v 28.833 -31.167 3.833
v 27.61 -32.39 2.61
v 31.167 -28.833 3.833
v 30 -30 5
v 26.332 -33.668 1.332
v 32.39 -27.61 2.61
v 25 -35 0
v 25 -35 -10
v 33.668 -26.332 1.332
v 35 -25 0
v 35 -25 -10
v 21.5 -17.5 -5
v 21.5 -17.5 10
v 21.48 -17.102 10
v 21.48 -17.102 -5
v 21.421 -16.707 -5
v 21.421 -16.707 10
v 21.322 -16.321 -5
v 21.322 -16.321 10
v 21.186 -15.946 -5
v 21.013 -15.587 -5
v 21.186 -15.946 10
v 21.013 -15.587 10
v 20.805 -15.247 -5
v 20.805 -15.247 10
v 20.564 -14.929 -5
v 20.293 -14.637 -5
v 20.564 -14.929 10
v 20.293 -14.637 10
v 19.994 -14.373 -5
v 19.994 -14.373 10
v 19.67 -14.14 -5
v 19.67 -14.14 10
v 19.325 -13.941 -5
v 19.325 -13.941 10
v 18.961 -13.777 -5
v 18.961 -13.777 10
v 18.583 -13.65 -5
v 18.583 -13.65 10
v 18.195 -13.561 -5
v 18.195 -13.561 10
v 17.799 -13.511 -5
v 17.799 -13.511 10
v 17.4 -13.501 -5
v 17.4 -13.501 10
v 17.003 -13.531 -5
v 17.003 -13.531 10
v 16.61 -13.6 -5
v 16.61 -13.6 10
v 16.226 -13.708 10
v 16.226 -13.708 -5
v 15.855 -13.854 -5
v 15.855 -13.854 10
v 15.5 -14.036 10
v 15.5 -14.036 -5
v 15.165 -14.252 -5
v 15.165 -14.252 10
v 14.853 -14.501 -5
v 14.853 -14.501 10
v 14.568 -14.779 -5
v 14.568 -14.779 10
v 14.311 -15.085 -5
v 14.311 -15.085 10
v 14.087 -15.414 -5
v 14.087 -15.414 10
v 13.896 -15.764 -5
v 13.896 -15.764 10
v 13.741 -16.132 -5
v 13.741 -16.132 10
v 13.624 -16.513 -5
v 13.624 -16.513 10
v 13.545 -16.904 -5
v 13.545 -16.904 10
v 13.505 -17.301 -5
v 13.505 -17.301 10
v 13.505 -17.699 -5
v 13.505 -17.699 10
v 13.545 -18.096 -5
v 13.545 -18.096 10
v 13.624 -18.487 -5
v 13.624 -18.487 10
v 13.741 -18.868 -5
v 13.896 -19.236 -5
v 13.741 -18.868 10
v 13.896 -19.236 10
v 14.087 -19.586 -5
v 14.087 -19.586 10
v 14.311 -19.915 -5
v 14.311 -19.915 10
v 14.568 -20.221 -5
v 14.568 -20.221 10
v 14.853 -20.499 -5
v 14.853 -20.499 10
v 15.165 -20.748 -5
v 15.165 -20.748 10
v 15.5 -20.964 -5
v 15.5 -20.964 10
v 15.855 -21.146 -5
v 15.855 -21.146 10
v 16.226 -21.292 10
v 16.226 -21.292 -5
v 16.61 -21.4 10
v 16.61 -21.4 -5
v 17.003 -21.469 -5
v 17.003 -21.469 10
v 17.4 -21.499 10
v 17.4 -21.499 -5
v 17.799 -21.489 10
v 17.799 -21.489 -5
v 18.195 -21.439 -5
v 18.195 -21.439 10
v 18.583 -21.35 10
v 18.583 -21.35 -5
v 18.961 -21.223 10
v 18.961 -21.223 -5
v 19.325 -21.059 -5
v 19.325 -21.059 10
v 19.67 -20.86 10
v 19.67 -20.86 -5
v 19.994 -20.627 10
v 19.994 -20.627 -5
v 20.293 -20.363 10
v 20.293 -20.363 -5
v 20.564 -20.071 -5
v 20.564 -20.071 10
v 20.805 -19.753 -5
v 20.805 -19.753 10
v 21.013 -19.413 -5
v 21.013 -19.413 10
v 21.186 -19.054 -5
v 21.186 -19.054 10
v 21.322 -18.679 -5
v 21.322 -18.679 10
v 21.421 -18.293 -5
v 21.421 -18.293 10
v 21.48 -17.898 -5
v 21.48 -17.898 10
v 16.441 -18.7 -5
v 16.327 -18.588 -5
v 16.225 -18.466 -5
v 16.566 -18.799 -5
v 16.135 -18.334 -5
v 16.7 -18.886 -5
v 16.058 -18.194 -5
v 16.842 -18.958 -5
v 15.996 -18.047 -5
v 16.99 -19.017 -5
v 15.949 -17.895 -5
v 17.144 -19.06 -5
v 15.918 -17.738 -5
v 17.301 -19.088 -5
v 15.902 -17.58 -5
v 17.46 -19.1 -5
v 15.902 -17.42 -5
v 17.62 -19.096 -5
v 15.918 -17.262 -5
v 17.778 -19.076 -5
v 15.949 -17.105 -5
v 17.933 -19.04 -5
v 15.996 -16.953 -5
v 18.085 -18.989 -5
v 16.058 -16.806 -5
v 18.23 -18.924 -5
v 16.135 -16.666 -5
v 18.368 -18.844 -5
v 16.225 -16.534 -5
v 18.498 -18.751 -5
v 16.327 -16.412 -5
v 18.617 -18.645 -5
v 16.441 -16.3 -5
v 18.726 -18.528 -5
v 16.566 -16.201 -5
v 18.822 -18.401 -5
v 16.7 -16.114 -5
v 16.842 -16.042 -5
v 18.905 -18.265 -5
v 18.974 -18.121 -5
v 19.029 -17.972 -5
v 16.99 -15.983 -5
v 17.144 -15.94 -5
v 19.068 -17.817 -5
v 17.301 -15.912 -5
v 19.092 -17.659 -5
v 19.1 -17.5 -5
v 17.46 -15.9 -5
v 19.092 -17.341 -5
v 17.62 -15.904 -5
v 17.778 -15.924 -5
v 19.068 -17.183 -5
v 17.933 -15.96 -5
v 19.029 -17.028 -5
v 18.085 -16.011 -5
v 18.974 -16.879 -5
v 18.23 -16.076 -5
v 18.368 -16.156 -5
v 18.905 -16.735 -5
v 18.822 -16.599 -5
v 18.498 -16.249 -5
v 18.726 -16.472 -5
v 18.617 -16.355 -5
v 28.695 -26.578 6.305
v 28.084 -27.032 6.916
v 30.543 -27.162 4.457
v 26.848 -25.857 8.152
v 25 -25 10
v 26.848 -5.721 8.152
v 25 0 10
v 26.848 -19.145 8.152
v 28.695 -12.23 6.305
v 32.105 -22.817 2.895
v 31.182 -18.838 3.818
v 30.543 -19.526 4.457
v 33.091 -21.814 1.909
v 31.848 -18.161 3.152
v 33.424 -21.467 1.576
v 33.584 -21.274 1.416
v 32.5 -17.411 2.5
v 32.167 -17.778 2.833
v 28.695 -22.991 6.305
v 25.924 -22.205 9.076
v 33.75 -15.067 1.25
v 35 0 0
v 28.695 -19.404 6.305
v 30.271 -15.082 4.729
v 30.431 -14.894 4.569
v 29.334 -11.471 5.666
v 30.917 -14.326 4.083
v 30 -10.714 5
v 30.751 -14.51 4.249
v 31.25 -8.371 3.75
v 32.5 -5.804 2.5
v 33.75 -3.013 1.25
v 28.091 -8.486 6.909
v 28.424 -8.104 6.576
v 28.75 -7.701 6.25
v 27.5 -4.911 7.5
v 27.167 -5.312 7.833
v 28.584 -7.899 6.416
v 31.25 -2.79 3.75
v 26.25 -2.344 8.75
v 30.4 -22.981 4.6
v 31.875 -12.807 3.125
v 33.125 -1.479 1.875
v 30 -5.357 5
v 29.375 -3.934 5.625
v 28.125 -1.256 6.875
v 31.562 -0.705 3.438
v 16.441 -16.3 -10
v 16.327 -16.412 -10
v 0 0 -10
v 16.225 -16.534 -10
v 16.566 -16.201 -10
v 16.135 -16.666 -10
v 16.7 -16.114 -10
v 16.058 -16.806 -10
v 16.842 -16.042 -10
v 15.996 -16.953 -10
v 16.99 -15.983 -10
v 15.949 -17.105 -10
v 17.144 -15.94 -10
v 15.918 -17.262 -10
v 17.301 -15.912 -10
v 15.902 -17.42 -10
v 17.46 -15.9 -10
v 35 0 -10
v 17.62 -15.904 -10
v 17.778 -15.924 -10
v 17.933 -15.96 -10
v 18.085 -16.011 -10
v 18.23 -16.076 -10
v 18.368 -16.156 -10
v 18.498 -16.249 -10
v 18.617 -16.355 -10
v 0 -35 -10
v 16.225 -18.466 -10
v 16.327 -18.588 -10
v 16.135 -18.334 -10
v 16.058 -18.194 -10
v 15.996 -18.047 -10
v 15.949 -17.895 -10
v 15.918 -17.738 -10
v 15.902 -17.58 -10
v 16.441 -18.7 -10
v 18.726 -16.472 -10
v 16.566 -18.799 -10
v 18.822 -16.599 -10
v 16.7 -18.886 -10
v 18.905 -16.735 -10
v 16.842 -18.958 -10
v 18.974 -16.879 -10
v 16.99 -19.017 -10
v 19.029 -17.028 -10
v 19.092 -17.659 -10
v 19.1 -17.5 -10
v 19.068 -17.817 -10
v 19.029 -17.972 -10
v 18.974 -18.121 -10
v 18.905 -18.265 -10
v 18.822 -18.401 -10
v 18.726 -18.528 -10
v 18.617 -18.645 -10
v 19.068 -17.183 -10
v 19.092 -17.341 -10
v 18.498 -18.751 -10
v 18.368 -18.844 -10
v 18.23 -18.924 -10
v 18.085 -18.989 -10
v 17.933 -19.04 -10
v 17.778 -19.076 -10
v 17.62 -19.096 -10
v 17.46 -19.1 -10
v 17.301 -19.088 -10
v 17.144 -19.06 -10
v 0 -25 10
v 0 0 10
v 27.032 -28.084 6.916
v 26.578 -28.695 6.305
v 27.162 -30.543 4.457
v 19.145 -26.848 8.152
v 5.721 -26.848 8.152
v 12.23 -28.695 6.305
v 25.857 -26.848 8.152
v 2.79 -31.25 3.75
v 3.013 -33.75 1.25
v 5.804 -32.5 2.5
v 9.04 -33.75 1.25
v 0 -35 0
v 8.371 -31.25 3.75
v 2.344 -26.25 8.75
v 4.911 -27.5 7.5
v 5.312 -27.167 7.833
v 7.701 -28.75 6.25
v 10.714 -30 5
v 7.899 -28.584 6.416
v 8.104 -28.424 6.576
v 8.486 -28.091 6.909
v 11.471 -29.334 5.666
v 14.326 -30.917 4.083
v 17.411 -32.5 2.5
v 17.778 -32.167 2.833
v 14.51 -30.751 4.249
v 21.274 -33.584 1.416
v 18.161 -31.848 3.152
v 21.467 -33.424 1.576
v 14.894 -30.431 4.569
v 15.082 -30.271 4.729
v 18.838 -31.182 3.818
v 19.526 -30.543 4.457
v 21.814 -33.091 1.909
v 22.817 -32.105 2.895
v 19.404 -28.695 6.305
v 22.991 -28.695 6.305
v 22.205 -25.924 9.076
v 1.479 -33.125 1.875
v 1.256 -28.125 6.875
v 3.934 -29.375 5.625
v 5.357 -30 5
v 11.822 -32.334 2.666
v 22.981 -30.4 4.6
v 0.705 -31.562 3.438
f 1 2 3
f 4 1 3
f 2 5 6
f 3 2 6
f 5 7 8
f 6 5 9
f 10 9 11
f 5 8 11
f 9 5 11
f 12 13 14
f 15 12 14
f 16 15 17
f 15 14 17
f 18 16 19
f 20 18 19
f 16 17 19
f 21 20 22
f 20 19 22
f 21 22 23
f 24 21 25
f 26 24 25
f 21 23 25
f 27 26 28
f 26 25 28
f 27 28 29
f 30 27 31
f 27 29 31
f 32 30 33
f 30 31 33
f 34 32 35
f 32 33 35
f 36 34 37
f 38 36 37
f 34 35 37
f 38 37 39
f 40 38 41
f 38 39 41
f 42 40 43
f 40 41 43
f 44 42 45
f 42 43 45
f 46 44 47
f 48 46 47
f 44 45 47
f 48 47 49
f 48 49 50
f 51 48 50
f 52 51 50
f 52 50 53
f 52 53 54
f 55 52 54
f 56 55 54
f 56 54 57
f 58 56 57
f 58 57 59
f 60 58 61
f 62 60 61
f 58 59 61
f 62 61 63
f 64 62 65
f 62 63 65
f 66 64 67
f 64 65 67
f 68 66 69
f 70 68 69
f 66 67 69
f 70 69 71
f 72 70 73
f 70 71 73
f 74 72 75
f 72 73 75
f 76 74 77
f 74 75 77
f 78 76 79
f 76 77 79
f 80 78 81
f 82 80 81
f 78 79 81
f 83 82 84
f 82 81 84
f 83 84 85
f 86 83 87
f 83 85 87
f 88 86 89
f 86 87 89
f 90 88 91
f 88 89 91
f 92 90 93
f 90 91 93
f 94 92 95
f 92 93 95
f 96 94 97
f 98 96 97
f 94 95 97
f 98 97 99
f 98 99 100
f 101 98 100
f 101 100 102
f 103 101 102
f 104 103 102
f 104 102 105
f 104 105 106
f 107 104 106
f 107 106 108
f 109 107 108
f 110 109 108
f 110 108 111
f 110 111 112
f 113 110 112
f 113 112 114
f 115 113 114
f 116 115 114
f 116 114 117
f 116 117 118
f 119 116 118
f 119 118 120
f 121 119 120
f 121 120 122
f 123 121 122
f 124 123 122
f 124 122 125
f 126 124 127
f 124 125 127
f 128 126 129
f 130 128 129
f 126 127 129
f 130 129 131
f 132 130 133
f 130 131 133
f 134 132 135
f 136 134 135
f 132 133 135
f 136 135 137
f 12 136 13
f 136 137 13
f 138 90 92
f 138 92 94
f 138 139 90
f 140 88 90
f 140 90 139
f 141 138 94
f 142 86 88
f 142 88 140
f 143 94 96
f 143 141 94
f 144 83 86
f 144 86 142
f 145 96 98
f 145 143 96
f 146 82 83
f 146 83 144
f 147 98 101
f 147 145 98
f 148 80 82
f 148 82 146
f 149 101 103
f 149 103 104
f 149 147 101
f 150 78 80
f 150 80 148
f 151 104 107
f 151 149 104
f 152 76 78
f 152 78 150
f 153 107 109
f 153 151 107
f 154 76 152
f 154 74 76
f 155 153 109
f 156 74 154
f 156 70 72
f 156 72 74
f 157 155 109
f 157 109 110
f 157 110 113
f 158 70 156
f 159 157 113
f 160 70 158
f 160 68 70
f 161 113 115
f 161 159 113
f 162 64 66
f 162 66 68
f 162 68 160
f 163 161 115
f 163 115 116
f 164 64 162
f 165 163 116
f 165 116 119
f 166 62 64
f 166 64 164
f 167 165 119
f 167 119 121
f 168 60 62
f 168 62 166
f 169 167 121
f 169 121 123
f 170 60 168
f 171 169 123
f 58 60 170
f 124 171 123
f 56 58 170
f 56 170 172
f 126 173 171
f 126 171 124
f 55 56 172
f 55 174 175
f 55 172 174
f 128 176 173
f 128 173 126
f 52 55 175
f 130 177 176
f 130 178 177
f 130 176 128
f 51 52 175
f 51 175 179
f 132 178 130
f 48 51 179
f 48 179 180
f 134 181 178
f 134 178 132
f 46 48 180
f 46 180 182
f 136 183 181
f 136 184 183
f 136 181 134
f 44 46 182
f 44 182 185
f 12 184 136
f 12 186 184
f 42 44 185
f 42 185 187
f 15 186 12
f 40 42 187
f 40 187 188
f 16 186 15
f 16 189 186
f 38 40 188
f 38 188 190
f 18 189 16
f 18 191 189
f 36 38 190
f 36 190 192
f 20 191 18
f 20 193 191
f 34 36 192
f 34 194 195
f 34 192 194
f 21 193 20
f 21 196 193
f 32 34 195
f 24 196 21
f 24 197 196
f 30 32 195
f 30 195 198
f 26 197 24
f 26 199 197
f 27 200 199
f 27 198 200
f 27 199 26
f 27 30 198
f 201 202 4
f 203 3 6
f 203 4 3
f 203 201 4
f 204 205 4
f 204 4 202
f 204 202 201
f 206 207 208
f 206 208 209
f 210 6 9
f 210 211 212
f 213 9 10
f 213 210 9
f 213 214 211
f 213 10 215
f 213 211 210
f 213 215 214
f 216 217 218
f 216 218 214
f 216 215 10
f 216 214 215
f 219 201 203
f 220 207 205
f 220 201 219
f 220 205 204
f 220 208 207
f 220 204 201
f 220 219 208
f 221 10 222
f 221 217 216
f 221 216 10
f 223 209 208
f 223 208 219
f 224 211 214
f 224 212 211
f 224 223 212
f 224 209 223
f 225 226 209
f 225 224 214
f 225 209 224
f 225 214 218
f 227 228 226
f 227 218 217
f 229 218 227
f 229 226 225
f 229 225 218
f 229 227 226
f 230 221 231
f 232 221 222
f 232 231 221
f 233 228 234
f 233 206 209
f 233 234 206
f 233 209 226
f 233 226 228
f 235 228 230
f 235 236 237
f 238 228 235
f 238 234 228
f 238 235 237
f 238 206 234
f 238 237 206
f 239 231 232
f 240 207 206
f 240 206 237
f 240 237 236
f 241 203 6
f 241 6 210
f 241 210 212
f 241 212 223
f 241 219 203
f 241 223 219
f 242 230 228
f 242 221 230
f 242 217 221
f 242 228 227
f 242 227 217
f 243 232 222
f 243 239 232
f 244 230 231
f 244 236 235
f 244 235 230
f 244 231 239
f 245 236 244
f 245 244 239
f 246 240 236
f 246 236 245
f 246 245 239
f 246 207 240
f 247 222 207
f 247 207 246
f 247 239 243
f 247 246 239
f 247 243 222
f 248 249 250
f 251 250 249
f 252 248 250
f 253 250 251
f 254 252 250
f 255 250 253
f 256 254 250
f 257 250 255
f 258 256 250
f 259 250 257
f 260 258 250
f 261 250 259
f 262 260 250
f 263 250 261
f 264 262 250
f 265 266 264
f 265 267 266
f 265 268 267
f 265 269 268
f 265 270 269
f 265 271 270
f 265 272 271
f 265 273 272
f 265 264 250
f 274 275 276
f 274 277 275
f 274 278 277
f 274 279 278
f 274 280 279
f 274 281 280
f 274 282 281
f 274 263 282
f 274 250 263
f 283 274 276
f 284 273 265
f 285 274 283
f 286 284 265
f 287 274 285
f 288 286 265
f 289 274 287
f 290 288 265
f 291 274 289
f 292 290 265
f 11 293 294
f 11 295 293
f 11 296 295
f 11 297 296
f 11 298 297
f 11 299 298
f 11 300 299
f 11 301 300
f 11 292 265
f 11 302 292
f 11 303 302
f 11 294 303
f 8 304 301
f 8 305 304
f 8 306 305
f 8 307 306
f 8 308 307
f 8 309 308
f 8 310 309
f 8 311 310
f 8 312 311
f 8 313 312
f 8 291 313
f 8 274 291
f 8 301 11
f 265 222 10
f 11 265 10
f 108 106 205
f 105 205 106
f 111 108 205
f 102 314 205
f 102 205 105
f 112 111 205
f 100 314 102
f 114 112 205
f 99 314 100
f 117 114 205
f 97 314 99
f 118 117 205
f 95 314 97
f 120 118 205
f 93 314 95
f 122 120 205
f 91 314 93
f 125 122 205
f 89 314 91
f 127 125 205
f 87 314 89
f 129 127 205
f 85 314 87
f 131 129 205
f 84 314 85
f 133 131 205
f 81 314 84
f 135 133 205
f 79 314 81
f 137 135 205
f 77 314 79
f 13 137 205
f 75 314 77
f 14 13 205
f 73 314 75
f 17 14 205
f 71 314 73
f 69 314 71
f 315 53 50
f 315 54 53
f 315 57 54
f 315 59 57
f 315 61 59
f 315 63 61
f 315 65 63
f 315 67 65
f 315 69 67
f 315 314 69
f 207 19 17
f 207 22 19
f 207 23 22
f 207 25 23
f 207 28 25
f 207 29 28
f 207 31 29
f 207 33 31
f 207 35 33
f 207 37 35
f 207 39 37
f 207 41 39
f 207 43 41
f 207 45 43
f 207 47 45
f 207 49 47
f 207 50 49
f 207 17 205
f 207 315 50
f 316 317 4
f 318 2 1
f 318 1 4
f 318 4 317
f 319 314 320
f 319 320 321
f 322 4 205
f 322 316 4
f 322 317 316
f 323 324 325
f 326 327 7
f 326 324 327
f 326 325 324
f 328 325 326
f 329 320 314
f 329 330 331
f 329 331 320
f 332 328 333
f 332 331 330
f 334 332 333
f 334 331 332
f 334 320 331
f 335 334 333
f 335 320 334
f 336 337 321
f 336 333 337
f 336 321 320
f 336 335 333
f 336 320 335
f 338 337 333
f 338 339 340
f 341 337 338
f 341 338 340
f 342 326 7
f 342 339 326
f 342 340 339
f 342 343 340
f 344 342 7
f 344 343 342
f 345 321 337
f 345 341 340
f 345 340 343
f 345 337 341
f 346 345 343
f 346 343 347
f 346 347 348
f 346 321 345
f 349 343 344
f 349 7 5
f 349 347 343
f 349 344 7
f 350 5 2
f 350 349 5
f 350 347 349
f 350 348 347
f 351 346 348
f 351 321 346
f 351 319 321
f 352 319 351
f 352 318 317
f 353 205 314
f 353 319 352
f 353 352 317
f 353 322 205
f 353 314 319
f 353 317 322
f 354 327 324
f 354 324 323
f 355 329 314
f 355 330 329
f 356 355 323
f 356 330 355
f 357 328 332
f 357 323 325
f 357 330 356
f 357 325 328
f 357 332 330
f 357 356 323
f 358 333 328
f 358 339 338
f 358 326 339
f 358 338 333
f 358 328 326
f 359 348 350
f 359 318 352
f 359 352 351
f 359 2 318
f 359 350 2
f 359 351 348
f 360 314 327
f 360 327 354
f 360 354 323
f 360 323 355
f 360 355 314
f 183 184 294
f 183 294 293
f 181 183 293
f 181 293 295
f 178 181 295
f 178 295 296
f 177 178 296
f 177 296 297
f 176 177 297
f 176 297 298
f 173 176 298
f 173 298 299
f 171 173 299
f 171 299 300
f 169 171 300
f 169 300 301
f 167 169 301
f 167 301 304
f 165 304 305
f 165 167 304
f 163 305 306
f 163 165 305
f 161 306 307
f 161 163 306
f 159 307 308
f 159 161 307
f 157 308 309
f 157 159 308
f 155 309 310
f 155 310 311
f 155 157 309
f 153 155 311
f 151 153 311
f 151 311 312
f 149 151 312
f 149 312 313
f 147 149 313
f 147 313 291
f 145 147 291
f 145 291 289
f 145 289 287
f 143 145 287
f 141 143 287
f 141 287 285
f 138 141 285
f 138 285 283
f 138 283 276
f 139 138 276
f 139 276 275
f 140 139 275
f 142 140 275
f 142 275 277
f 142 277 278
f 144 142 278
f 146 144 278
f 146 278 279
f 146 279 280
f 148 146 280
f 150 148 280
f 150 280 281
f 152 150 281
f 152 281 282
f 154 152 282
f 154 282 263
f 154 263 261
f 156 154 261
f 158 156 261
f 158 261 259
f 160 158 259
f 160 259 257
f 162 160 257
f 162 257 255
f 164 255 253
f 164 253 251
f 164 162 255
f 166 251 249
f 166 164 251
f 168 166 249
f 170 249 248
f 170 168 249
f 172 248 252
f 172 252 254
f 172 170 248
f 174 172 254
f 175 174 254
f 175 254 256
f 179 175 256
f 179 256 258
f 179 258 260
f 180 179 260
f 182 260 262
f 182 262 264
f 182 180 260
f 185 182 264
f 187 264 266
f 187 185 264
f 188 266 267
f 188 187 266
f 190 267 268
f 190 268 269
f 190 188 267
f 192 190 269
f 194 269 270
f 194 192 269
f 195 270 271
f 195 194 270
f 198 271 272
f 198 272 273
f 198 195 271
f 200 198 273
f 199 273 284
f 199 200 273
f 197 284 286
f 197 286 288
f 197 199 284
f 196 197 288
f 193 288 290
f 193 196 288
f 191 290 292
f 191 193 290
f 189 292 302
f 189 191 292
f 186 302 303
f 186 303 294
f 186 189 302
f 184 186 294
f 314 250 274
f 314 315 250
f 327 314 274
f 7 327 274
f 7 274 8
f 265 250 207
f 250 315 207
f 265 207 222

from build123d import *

# Parameters (mm, degrees)
F0_W      = 35
F0_H      = 35
F2_W      = 25
F2_H      = 25
F4_W      = 35
F4_H      = 35
F4_R      = 1.6
F5_DEPTH  = 10
F6_DEPTH  = 10.0010001
F7_R      = 4
F7_R_2    = 1.6
F8_DEPTH  = 15
F10_DEPTH = 25


with BuildPart() as f3:
    # F0 (on Top) → F3 section 0
    with BuildSketch(Plane.XY):
        with Locations((17.5, -17.5)):
            Rectangle(F0_W, F0_H)
    # F2 (on offset) → F3 section 1
    with BuildSketch(Plane.XY.offset(10)):
        with Locations((12.5, -12.5)):
            Rectangle(F2_W, F2_H)
    loft()

    # F4 (on face) → F5 (join)
    with BuildSketch(Plane(origin=(0, 0, 0), x_dir=(1, 0, 0), z_dir=(0, 0, -1))):
        with Locations((17.5, 17.5)):
            Rectangle(F4_W, F4_H)
        with Locations((17.5, 17.5)):
            Circle(F4_R, mode=Mode.SUBTRACT)
    extrude(amount=F5_DEPTH)

    # F4 (on face) → F6 (cut, through all)
    with BuildSketch(Plane(origin=(0, 0, 0), x_dir=(1, 0, 0), z_dir=(0, 0, -1))):
        with Locations((17.5, 17.5)):
            Circle(F4_R)
    extrude(amount=-F6_DEPTH, mode=Mode.SUBTRACT)

    # F7 (on face) → F8 (cut)
    with BuildSketch(Plane.XY.offset(10)):
        with Locations((17.5, -17.5)):
            Circle(F7_R)
        with Locations((17.5, -17.5)):
            Circle(F7_R_2, mode=Mode.SUBTRACT)
    extrude(amount=-F8_DEPTH, mode=Mode.SUBTRACT)

    # F9 (on face) → F10 (cut)
    with BuildSketch(Plane(origin=(0, 0, -10), x_dir=(1, 0, 0), z_dir=(0, 0, -1))):
        Polygon((35, 25), (35, 35), (25, 35), align=None)
    extrude(amount=-F10_DEPTH, mode=Mode.SUBTRACT)


solid = f3.part
